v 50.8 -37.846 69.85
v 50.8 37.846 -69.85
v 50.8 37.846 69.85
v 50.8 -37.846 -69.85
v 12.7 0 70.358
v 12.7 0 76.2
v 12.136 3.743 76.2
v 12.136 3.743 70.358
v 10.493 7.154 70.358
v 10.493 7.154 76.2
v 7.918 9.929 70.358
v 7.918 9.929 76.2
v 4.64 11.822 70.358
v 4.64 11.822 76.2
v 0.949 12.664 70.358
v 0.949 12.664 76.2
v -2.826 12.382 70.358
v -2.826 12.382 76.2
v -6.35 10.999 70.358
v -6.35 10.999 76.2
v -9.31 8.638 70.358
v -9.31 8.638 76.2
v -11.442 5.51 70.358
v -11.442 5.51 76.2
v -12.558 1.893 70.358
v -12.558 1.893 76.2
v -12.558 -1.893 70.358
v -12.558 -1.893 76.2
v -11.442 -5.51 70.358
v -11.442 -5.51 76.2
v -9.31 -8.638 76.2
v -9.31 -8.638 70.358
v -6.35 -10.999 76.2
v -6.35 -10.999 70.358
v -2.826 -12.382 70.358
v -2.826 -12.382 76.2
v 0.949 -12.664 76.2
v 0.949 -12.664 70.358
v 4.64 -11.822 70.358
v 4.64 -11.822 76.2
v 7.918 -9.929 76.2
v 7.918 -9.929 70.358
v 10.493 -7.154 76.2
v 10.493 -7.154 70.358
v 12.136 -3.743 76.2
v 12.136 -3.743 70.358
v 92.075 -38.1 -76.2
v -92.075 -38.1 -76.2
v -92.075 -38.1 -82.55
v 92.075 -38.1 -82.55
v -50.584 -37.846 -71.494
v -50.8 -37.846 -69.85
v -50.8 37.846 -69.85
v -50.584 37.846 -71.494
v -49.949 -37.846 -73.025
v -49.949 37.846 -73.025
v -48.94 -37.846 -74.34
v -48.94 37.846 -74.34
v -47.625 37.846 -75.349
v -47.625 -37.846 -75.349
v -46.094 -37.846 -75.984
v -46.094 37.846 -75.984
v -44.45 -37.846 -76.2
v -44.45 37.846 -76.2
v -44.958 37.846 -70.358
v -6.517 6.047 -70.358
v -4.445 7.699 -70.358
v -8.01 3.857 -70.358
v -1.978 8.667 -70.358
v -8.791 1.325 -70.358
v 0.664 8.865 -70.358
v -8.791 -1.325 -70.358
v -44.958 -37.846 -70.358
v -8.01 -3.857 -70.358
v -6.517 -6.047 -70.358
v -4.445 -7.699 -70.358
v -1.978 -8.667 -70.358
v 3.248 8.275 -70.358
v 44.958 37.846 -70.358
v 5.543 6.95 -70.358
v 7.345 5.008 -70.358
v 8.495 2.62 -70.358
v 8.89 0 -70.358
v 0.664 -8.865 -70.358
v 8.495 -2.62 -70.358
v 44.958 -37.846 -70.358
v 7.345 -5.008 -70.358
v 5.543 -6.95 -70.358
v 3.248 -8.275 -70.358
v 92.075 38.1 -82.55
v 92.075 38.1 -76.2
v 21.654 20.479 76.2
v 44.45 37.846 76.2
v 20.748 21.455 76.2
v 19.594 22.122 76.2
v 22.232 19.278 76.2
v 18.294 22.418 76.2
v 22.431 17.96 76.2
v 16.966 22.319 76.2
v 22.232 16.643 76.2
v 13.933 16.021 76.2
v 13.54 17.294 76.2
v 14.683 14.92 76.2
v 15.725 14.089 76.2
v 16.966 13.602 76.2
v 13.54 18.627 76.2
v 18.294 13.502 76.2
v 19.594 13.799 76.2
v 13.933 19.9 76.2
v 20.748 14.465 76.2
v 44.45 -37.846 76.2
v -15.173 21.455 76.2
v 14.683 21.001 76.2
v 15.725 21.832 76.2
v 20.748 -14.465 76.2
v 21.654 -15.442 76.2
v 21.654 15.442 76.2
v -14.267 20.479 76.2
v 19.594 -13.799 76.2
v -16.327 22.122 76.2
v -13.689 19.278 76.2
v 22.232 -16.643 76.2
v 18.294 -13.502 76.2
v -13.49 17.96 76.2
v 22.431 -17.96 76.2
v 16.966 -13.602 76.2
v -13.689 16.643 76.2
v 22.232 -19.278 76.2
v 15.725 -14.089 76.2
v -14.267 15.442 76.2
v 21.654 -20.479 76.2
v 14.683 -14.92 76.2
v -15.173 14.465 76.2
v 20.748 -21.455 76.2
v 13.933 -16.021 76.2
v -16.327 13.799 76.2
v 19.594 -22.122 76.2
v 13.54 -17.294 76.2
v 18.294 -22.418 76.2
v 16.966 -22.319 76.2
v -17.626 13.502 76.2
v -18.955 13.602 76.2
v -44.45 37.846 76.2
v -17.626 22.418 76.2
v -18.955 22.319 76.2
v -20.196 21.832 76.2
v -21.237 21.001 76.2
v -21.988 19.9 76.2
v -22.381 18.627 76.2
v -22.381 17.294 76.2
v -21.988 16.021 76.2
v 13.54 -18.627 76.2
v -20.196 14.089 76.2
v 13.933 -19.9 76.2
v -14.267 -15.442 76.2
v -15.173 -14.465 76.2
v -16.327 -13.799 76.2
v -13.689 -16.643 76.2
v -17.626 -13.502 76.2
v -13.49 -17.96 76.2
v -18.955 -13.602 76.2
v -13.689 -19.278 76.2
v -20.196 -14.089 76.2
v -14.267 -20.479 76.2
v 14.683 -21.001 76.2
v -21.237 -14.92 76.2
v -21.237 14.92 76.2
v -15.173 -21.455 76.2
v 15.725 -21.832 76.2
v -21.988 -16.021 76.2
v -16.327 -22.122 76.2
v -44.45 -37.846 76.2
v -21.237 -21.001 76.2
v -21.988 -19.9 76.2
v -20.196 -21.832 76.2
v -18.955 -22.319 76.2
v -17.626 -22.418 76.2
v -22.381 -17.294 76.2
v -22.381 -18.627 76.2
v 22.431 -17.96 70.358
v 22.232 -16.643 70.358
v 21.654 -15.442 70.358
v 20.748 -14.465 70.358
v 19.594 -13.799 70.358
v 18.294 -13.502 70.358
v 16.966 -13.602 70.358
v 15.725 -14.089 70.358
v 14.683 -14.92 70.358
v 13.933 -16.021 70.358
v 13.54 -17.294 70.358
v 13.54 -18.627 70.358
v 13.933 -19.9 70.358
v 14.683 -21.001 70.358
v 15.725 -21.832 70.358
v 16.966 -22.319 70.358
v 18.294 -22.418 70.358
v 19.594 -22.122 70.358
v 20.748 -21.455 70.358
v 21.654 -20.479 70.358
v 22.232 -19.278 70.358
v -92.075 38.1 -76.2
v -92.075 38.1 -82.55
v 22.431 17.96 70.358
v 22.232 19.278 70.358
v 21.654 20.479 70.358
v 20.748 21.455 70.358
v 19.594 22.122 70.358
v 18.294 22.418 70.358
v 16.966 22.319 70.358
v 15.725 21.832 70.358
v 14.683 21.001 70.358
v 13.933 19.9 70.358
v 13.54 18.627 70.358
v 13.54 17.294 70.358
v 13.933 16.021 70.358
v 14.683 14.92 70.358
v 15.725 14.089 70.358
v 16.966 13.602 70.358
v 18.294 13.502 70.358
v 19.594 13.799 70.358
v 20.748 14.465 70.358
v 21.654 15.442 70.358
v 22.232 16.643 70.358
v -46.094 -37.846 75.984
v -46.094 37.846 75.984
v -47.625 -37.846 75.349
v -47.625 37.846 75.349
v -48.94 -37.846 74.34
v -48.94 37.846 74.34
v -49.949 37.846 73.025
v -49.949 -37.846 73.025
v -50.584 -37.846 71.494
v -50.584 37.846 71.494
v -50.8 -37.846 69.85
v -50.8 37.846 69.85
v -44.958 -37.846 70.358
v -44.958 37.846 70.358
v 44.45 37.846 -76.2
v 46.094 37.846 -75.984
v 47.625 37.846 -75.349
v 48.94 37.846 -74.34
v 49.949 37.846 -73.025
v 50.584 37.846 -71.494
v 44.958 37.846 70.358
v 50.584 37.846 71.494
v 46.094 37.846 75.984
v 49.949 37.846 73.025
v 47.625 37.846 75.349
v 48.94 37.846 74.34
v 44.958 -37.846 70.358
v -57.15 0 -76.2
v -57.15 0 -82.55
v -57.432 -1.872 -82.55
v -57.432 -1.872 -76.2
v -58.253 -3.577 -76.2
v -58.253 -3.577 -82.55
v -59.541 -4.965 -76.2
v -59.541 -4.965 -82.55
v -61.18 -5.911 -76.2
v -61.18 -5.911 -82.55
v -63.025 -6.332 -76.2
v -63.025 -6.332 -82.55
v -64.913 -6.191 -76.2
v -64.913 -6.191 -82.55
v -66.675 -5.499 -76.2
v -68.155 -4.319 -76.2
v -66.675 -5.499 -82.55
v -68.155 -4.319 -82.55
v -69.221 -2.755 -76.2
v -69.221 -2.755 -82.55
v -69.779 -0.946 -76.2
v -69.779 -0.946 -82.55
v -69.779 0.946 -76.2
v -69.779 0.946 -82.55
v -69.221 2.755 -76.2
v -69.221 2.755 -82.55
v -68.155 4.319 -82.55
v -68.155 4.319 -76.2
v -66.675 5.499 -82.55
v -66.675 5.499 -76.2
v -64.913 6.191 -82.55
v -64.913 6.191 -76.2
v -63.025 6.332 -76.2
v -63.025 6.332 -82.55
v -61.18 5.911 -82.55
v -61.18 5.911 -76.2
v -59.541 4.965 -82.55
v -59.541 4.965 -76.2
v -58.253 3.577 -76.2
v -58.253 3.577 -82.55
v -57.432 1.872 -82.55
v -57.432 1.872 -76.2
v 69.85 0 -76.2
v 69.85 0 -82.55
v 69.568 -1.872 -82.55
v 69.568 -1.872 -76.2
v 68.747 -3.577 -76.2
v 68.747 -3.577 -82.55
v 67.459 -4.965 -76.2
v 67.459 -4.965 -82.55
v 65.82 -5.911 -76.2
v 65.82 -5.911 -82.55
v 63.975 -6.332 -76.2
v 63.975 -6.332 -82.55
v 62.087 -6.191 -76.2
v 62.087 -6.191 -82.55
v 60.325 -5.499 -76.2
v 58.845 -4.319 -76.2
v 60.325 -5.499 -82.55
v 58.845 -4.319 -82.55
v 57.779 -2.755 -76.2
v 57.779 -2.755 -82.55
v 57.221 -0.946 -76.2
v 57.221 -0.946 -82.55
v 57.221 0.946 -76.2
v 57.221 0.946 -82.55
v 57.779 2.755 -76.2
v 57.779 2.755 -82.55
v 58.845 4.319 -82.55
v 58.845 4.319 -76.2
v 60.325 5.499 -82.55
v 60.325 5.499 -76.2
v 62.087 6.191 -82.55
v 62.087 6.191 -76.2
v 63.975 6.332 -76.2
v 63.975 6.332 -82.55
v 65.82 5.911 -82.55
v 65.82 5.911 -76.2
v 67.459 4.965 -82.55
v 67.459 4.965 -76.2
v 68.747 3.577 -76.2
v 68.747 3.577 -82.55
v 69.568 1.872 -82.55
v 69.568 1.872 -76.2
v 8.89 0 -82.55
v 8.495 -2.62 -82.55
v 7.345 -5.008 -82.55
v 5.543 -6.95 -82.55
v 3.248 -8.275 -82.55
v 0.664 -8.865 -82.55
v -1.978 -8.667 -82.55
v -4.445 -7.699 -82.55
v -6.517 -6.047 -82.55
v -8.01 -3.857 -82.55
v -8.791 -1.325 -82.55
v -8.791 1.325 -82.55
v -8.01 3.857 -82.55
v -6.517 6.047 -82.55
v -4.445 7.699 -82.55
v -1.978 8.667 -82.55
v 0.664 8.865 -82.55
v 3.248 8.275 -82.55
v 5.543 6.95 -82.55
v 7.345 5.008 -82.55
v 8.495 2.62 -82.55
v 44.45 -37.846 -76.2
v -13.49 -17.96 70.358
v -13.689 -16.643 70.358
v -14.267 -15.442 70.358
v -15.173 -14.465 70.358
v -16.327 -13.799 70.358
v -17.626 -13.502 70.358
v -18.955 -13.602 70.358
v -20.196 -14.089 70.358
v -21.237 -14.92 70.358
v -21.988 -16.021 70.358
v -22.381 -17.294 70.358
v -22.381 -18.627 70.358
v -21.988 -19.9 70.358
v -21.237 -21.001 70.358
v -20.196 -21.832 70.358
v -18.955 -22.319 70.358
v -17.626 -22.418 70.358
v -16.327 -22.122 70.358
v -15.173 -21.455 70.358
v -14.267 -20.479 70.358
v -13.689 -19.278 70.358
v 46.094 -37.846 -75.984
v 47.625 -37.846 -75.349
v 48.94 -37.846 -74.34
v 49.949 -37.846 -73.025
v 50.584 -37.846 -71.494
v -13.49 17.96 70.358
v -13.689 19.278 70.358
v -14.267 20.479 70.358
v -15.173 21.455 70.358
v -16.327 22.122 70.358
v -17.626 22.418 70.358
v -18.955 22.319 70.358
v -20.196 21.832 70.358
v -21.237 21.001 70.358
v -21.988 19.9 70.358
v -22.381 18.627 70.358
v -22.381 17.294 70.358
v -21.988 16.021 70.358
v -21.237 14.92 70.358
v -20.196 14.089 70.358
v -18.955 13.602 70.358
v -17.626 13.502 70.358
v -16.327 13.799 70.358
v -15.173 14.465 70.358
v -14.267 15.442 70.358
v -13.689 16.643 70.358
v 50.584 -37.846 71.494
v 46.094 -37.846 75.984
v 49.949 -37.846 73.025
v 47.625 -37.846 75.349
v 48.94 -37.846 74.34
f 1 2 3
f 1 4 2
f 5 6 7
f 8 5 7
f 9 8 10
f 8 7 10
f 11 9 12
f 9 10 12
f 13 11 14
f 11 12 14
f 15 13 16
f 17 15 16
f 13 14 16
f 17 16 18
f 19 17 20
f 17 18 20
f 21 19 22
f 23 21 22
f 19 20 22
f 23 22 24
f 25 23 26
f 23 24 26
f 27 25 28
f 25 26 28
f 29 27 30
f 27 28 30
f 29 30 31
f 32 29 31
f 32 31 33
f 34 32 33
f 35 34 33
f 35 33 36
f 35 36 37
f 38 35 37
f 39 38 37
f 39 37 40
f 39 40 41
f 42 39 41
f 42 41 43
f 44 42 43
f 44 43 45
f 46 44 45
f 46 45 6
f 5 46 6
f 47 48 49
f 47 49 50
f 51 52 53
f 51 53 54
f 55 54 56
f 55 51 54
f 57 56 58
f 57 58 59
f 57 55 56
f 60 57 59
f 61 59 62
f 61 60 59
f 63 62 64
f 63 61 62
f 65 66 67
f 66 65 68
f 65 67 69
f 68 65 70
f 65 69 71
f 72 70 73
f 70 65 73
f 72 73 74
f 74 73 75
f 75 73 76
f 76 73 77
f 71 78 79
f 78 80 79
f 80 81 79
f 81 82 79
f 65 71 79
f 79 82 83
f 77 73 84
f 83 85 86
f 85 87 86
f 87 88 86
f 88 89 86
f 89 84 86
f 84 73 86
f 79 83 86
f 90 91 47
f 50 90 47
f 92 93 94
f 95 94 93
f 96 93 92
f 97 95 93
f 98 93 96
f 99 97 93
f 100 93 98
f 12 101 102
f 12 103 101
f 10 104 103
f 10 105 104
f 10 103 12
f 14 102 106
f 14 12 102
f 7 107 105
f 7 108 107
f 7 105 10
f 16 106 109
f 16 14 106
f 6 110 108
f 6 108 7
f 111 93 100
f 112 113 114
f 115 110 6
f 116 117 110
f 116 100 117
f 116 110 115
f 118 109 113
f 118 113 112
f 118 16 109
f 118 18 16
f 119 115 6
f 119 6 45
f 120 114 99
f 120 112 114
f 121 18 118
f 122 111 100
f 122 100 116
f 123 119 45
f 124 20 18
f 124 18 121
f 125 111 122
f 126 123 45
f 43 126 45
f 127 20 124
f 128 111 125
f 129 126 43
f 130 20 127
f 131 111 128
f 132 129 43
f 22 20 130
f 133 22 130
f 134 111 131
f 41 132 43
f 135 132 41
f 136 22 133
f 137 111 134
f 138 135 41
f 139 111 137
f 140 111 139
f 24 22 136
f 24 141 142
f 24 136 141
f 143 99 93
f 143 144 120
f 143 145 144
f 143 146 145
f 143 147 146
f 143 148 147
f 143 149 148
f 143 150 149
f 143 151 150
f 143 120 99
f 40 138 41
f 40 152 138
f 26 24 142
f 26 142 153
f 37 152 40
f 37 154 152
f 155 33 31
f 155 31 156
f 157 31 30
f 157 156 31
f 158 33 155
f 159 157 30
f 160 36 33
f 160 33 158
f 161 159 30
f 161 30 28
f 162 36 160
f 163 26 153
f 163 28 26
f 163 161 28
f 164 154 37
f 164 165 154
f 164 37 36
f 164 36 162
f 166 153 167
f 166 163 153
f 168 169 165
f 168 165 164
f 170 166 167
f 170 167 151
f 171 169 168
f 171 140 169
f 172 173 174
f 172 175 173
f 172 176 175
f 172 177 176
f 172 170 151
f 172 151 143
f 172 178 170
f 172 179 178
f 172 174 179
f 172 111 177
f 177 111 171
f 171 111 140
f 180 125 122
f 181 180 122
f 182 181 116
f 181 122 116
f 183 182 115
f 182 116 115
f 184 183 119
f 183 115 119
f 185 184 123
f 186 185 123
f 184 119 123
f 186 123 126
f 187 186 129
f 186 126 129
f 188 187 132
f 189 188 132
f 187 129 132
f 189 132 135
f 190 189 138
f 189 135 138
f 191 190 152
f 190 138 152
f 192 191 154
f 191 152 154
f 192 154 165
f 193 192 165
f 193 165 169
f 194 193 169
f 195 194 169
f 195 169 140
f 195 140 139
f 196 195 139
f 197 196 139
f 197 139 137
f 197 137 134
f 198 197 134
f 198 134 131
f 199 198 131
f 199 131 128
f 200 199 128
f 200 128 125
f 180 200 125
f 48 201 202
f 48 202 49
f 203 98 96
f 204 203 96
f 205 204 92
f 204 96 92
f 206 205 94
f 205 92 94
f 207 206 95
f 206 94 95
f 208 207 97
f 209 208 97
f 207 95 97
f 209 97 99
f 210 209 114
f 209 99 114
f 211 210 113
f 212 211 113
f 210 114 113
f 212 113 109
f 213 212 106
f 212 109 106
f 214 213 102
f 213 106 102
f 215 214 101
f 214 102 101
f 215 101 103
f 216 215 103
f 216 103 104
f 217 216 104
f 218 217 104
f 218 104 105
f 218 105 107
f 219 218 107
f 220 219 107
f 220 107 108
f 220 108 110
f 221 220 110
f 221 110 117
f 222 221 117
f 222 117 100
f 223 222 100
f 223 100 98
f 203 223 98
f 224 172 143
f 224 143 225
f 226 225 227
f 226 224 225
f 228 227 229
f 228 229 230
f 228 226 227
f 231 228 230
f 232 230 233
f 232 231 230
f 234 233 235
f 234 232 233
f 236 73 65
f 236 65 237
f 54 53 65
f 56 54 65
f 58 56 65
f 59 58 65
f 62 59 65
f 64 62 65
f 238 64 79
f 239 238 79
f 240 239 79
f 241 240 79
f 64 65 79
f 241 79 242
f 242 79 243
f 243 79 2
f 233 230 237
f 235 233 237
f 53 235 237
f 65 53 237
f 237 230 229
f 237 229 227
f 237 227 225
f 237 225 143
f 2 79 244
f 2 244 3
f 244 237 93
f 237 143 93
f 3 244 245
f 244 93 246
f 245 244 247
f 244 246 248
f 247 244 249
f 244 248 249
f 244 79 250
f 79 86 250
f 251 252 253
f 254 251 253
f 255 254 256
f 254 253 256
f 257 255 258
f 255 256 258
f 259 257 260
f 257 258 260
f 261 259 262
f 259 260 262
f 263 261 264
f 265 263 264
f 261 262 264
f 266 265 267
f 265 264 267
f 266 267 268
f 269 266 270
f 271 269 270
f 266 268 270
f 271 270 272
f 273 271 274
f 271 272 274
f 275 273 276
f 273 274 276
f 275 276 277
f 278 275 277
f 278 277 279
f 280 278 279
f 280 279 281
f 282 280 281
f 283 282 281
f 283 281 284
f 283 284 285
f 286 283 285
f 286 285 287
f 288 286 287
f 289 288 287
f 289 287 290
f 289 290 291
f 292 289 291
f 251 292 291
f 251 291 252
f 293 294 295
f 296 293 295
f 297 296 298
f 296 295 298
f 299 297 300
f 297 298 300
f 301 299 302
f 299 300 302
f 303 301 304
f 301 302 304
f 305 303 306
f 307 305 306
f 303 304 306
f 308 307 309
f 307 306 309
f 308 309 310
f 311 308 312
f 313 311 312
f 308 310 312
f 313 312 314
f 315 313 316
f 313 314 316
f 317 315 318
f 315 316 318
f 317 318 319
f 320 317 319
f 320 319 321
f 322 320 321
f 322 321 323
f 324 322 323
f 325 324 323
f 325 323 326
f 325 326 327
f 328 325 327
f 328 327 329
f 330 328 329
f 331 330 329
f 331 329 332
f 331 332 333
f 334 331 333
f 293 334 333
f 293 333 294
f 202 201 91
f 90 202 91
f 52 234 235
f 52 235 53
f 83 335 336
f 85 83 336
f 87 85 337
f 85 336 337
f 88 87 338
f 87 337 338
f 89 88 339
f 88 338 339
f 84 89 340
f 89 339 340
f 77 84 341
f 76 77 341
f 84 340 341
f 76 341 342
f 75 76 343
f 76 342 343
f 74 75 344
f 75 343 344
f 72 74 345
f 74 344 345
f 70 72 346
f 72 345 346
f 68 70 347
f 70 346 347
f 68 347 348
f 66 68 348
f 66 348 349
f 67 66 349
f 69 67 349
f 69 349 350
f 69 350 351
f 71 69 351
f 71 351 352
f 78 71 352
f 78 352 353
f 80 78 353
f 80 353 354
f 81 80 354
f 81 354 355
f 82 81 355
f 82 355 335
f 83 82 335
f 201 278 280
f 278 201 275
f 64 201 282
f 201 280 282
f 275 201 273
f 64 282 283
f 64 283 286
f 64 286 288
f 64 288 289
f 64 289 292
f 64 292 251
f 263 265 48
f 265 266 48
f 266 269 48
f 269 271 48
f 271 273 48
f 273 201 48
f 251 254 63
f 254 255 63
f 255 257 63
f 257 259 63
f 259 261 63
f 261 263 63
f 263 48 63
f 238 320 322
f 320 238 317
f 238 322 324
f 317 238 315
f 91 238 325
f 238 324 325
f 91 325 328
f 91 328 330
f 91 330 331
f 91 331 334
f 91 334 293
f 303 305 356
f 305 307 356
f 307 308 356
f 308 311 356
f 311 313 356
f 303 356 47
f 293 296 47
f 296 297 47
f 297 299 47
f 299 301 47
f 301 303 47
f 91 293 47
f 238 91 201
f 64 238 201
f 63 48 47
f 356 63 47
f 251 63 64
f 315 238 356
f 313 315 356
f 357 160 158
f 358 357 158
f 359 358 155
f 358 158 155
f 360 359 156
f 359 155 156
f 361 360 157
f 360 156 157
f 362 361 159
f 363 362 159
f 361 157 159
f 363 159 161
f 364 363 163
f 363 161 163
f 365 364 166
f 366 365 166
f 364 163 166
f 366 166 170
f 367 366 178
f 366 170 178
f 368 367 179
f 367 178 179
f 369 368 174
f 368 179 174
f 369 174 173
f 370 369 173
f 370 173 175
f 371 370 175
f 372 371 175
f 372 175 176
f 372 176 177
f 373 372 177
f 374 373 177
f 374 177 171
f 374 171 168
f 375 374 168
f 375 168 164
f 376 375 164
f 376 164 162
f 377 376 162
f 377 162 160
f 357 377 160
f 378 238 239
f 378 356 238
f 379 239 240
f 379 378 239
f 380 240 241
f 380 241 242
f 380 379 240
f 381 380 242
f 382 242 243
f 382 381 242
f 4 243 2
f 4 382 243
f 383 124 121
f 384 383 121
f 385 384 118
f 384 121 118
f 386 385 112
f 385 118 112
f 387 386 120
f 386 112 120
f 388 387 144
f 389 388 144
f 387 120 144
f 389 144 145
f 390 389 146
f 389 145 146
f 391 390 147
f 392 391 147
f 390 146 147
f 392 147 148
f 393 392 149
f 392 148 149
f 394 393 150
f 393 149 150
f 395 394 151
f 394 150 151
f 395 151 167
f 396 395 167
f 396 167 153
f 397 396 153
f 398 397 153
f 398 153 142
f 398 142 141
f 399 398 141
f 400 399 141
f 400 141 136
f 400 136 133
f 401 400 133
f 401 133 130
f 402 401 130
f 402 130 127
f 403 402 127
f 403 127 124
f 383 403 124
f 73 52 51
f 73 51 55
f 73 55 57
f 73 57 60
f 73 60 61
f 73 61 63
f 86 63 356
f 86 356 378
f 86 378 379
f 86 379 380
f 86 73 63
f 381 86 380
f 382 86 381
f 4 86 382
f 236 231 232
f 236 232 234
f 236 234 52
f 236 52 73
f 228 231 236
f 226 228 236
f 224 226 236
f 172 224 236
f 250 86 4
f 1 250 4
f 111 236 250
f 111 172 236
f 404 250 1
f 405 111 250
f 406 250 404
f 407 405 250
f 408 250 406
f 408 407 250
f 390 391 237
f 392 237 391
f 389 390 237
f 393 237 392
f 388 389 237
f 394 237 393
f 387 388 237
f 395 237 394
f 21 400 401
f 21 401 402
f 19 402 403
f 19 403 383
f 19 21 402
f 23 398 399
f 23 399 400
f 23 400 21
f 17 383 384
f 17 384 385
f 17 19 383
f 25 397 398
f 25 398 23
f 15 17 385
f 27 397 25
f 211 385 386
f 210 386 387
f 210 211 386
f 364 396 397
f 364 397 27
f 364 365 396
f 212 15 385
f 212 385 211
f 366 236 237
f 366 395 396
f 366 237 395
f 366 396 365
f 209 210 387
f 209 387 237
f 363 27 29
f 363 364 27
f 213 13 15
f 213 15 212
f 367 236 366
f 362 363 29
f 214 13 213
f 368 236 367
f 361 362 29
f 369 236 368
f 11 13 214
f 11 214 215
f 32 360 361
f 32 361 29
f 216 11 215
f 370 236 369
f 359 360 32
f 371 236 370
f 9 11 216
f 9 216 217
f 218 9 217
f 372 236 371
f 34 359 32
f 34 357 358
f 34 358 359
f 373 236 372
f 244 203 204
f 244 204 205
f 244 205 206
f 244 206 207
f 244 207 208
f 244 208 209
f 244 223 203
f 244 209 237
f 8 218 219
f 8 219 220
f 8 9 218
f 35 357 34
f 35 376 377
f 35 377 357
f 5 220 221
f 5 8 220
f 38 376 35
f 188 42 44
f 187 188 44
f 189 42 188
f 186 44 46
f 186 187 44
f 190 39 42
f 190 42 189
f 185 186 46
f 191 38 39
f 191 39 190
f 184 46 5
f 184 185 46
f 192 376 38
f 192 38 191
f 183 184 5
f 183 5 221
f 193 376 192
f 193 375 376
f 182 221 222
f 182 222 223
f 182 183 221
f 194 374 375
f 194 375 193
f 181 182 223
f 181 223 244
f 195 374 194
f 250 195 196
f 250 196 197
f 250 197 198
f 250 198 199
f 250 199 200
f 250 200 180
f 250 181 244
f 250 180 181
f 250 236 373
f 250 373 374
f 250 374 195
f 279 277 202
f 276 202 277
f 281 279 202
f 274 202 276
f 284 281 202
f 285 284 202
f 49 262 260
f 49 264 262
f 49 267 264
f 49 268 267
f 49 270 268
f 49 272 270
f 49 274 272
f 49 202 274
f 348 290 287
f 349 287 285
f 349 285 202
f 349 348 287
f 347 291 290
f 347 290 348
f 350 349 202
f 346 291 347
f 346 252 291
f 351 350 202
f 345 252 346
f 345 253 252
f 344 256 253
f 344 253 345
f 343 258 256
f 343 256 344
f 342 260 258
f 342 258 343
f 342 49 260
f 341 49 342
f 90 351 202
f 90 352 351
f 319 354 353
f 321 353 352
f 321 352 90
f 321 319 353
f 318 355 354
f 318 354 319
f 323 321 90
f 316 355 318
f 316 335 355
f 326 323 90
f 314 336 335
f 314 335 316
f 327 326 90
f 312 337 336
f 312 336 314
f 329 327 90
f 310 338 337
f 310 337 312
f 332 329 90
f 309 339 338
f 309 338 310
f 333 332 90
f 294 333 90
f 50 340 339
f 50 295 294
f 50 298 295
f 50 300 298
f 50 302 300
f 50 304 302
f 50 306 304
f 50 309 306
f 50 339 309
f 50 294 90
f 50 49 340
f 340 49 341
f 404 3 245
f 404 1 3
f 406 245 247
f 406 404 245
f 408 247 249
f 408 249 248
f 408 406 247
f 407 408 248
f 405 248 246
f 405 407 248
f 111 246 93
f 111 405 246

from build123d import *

# Parameters (mm, degrees)
F0_W     = 89.916
F0_H     = 140.716
F1_DEPTH = 37.846
F2_R     = 4.4704
F2_R_2   = 12.7
F3_DEPTH = 25.4
F4_W     = 184.15
F4_H     = 76.2
F4_W_2   = 88.9
F4_H_2   = 75.692
F5_DEPTH = 6.35
F6_R     = 6.35
F6_R_2   = 8.89
F7_DEPTH = 25.4


with BuildPart() as f1:
    # F0 (on Front) → F1 (new body, symmetric)
    with BuildSketch(Plane.XZ):
        with BuildLine():
            Line((44.45, 76.2), (-44.45, 76.2))
            ThreePointArc((-44.45, 76.2), (-48.9401280605, 74.3401280605), (-50.8, 69.85))
            Line((-50.8, 69.85), (-50.8, -69.85))
            ThreePointArc((-50.8, -69.85), (-48.9401280605, -74.3401280605), (-44.45, -76.2))
            Line((-44.45, -76.2), (44.45, -76.2))
            ThreePointArc((44.45, -76.2), (48.9401280605, -74.3401280605), (50.8, -69.85))
            Line((50.8, -69.85), (50.8, 69.85))
            ThreePointArc((50.8, 69.85), (48.9401280605, 74.3401280605), (44.45, 76.2))
        make_face()
        Rectangle(F0_W, F0_H, mode=Mode.SUBTRACT)
    extrude(amount=F1_DEPTH, both=True)

    # F2 (on face) → F3 (cut)
    with BuildSketch(Plane.XY.offset(76.2)):
        with Locations((-17.96034, 17.96034)):
            Circle(F2_R)
        with Locations((17.96034, 17.96034)):
            Circle(F2_R)
        with Locations((17.96034, -17.96034)):
            Circle(F2_R)
        with Locations((-17.96034, -17.96034)):
            Circle(F2_R)
        Circle(F2_R_2)
    extrude(amount=-F3_DEPTH, mode=Mode.SUBTRACT)

    # F4 (on face) → F5 (join)
    with BuildSketch(Plane(origin=(0, 0, -76.2), x_dir=(1, 0, 0), z_dir=(0, 0, -1))):
        Rectangle(F4_W, F4_H)
        Rectangle(F4_W_2, F4_H_2, mode=Mode.SUBTRACT)
        Rectangle(F4_W_2, F4_H_2)
    extrude(amount=F5_DEPTH)

    # F6 (on face) → F7 (cut)
    with BuildSketch(Plane(origin=(0, 0, -82.55), x_dir=(1, 0, 0), z_dir=(0, 0, -1))):
        with Locations((63.5, 0)):
            Circle(F6_R)
        Circle(F6_R_2)
        with Locations((-63.5, 0)):
            Circle(F6_R)
    extrude(amount=-F7_DEPTH, mode=Mode.SUBTRACT)


solid = f1.part
